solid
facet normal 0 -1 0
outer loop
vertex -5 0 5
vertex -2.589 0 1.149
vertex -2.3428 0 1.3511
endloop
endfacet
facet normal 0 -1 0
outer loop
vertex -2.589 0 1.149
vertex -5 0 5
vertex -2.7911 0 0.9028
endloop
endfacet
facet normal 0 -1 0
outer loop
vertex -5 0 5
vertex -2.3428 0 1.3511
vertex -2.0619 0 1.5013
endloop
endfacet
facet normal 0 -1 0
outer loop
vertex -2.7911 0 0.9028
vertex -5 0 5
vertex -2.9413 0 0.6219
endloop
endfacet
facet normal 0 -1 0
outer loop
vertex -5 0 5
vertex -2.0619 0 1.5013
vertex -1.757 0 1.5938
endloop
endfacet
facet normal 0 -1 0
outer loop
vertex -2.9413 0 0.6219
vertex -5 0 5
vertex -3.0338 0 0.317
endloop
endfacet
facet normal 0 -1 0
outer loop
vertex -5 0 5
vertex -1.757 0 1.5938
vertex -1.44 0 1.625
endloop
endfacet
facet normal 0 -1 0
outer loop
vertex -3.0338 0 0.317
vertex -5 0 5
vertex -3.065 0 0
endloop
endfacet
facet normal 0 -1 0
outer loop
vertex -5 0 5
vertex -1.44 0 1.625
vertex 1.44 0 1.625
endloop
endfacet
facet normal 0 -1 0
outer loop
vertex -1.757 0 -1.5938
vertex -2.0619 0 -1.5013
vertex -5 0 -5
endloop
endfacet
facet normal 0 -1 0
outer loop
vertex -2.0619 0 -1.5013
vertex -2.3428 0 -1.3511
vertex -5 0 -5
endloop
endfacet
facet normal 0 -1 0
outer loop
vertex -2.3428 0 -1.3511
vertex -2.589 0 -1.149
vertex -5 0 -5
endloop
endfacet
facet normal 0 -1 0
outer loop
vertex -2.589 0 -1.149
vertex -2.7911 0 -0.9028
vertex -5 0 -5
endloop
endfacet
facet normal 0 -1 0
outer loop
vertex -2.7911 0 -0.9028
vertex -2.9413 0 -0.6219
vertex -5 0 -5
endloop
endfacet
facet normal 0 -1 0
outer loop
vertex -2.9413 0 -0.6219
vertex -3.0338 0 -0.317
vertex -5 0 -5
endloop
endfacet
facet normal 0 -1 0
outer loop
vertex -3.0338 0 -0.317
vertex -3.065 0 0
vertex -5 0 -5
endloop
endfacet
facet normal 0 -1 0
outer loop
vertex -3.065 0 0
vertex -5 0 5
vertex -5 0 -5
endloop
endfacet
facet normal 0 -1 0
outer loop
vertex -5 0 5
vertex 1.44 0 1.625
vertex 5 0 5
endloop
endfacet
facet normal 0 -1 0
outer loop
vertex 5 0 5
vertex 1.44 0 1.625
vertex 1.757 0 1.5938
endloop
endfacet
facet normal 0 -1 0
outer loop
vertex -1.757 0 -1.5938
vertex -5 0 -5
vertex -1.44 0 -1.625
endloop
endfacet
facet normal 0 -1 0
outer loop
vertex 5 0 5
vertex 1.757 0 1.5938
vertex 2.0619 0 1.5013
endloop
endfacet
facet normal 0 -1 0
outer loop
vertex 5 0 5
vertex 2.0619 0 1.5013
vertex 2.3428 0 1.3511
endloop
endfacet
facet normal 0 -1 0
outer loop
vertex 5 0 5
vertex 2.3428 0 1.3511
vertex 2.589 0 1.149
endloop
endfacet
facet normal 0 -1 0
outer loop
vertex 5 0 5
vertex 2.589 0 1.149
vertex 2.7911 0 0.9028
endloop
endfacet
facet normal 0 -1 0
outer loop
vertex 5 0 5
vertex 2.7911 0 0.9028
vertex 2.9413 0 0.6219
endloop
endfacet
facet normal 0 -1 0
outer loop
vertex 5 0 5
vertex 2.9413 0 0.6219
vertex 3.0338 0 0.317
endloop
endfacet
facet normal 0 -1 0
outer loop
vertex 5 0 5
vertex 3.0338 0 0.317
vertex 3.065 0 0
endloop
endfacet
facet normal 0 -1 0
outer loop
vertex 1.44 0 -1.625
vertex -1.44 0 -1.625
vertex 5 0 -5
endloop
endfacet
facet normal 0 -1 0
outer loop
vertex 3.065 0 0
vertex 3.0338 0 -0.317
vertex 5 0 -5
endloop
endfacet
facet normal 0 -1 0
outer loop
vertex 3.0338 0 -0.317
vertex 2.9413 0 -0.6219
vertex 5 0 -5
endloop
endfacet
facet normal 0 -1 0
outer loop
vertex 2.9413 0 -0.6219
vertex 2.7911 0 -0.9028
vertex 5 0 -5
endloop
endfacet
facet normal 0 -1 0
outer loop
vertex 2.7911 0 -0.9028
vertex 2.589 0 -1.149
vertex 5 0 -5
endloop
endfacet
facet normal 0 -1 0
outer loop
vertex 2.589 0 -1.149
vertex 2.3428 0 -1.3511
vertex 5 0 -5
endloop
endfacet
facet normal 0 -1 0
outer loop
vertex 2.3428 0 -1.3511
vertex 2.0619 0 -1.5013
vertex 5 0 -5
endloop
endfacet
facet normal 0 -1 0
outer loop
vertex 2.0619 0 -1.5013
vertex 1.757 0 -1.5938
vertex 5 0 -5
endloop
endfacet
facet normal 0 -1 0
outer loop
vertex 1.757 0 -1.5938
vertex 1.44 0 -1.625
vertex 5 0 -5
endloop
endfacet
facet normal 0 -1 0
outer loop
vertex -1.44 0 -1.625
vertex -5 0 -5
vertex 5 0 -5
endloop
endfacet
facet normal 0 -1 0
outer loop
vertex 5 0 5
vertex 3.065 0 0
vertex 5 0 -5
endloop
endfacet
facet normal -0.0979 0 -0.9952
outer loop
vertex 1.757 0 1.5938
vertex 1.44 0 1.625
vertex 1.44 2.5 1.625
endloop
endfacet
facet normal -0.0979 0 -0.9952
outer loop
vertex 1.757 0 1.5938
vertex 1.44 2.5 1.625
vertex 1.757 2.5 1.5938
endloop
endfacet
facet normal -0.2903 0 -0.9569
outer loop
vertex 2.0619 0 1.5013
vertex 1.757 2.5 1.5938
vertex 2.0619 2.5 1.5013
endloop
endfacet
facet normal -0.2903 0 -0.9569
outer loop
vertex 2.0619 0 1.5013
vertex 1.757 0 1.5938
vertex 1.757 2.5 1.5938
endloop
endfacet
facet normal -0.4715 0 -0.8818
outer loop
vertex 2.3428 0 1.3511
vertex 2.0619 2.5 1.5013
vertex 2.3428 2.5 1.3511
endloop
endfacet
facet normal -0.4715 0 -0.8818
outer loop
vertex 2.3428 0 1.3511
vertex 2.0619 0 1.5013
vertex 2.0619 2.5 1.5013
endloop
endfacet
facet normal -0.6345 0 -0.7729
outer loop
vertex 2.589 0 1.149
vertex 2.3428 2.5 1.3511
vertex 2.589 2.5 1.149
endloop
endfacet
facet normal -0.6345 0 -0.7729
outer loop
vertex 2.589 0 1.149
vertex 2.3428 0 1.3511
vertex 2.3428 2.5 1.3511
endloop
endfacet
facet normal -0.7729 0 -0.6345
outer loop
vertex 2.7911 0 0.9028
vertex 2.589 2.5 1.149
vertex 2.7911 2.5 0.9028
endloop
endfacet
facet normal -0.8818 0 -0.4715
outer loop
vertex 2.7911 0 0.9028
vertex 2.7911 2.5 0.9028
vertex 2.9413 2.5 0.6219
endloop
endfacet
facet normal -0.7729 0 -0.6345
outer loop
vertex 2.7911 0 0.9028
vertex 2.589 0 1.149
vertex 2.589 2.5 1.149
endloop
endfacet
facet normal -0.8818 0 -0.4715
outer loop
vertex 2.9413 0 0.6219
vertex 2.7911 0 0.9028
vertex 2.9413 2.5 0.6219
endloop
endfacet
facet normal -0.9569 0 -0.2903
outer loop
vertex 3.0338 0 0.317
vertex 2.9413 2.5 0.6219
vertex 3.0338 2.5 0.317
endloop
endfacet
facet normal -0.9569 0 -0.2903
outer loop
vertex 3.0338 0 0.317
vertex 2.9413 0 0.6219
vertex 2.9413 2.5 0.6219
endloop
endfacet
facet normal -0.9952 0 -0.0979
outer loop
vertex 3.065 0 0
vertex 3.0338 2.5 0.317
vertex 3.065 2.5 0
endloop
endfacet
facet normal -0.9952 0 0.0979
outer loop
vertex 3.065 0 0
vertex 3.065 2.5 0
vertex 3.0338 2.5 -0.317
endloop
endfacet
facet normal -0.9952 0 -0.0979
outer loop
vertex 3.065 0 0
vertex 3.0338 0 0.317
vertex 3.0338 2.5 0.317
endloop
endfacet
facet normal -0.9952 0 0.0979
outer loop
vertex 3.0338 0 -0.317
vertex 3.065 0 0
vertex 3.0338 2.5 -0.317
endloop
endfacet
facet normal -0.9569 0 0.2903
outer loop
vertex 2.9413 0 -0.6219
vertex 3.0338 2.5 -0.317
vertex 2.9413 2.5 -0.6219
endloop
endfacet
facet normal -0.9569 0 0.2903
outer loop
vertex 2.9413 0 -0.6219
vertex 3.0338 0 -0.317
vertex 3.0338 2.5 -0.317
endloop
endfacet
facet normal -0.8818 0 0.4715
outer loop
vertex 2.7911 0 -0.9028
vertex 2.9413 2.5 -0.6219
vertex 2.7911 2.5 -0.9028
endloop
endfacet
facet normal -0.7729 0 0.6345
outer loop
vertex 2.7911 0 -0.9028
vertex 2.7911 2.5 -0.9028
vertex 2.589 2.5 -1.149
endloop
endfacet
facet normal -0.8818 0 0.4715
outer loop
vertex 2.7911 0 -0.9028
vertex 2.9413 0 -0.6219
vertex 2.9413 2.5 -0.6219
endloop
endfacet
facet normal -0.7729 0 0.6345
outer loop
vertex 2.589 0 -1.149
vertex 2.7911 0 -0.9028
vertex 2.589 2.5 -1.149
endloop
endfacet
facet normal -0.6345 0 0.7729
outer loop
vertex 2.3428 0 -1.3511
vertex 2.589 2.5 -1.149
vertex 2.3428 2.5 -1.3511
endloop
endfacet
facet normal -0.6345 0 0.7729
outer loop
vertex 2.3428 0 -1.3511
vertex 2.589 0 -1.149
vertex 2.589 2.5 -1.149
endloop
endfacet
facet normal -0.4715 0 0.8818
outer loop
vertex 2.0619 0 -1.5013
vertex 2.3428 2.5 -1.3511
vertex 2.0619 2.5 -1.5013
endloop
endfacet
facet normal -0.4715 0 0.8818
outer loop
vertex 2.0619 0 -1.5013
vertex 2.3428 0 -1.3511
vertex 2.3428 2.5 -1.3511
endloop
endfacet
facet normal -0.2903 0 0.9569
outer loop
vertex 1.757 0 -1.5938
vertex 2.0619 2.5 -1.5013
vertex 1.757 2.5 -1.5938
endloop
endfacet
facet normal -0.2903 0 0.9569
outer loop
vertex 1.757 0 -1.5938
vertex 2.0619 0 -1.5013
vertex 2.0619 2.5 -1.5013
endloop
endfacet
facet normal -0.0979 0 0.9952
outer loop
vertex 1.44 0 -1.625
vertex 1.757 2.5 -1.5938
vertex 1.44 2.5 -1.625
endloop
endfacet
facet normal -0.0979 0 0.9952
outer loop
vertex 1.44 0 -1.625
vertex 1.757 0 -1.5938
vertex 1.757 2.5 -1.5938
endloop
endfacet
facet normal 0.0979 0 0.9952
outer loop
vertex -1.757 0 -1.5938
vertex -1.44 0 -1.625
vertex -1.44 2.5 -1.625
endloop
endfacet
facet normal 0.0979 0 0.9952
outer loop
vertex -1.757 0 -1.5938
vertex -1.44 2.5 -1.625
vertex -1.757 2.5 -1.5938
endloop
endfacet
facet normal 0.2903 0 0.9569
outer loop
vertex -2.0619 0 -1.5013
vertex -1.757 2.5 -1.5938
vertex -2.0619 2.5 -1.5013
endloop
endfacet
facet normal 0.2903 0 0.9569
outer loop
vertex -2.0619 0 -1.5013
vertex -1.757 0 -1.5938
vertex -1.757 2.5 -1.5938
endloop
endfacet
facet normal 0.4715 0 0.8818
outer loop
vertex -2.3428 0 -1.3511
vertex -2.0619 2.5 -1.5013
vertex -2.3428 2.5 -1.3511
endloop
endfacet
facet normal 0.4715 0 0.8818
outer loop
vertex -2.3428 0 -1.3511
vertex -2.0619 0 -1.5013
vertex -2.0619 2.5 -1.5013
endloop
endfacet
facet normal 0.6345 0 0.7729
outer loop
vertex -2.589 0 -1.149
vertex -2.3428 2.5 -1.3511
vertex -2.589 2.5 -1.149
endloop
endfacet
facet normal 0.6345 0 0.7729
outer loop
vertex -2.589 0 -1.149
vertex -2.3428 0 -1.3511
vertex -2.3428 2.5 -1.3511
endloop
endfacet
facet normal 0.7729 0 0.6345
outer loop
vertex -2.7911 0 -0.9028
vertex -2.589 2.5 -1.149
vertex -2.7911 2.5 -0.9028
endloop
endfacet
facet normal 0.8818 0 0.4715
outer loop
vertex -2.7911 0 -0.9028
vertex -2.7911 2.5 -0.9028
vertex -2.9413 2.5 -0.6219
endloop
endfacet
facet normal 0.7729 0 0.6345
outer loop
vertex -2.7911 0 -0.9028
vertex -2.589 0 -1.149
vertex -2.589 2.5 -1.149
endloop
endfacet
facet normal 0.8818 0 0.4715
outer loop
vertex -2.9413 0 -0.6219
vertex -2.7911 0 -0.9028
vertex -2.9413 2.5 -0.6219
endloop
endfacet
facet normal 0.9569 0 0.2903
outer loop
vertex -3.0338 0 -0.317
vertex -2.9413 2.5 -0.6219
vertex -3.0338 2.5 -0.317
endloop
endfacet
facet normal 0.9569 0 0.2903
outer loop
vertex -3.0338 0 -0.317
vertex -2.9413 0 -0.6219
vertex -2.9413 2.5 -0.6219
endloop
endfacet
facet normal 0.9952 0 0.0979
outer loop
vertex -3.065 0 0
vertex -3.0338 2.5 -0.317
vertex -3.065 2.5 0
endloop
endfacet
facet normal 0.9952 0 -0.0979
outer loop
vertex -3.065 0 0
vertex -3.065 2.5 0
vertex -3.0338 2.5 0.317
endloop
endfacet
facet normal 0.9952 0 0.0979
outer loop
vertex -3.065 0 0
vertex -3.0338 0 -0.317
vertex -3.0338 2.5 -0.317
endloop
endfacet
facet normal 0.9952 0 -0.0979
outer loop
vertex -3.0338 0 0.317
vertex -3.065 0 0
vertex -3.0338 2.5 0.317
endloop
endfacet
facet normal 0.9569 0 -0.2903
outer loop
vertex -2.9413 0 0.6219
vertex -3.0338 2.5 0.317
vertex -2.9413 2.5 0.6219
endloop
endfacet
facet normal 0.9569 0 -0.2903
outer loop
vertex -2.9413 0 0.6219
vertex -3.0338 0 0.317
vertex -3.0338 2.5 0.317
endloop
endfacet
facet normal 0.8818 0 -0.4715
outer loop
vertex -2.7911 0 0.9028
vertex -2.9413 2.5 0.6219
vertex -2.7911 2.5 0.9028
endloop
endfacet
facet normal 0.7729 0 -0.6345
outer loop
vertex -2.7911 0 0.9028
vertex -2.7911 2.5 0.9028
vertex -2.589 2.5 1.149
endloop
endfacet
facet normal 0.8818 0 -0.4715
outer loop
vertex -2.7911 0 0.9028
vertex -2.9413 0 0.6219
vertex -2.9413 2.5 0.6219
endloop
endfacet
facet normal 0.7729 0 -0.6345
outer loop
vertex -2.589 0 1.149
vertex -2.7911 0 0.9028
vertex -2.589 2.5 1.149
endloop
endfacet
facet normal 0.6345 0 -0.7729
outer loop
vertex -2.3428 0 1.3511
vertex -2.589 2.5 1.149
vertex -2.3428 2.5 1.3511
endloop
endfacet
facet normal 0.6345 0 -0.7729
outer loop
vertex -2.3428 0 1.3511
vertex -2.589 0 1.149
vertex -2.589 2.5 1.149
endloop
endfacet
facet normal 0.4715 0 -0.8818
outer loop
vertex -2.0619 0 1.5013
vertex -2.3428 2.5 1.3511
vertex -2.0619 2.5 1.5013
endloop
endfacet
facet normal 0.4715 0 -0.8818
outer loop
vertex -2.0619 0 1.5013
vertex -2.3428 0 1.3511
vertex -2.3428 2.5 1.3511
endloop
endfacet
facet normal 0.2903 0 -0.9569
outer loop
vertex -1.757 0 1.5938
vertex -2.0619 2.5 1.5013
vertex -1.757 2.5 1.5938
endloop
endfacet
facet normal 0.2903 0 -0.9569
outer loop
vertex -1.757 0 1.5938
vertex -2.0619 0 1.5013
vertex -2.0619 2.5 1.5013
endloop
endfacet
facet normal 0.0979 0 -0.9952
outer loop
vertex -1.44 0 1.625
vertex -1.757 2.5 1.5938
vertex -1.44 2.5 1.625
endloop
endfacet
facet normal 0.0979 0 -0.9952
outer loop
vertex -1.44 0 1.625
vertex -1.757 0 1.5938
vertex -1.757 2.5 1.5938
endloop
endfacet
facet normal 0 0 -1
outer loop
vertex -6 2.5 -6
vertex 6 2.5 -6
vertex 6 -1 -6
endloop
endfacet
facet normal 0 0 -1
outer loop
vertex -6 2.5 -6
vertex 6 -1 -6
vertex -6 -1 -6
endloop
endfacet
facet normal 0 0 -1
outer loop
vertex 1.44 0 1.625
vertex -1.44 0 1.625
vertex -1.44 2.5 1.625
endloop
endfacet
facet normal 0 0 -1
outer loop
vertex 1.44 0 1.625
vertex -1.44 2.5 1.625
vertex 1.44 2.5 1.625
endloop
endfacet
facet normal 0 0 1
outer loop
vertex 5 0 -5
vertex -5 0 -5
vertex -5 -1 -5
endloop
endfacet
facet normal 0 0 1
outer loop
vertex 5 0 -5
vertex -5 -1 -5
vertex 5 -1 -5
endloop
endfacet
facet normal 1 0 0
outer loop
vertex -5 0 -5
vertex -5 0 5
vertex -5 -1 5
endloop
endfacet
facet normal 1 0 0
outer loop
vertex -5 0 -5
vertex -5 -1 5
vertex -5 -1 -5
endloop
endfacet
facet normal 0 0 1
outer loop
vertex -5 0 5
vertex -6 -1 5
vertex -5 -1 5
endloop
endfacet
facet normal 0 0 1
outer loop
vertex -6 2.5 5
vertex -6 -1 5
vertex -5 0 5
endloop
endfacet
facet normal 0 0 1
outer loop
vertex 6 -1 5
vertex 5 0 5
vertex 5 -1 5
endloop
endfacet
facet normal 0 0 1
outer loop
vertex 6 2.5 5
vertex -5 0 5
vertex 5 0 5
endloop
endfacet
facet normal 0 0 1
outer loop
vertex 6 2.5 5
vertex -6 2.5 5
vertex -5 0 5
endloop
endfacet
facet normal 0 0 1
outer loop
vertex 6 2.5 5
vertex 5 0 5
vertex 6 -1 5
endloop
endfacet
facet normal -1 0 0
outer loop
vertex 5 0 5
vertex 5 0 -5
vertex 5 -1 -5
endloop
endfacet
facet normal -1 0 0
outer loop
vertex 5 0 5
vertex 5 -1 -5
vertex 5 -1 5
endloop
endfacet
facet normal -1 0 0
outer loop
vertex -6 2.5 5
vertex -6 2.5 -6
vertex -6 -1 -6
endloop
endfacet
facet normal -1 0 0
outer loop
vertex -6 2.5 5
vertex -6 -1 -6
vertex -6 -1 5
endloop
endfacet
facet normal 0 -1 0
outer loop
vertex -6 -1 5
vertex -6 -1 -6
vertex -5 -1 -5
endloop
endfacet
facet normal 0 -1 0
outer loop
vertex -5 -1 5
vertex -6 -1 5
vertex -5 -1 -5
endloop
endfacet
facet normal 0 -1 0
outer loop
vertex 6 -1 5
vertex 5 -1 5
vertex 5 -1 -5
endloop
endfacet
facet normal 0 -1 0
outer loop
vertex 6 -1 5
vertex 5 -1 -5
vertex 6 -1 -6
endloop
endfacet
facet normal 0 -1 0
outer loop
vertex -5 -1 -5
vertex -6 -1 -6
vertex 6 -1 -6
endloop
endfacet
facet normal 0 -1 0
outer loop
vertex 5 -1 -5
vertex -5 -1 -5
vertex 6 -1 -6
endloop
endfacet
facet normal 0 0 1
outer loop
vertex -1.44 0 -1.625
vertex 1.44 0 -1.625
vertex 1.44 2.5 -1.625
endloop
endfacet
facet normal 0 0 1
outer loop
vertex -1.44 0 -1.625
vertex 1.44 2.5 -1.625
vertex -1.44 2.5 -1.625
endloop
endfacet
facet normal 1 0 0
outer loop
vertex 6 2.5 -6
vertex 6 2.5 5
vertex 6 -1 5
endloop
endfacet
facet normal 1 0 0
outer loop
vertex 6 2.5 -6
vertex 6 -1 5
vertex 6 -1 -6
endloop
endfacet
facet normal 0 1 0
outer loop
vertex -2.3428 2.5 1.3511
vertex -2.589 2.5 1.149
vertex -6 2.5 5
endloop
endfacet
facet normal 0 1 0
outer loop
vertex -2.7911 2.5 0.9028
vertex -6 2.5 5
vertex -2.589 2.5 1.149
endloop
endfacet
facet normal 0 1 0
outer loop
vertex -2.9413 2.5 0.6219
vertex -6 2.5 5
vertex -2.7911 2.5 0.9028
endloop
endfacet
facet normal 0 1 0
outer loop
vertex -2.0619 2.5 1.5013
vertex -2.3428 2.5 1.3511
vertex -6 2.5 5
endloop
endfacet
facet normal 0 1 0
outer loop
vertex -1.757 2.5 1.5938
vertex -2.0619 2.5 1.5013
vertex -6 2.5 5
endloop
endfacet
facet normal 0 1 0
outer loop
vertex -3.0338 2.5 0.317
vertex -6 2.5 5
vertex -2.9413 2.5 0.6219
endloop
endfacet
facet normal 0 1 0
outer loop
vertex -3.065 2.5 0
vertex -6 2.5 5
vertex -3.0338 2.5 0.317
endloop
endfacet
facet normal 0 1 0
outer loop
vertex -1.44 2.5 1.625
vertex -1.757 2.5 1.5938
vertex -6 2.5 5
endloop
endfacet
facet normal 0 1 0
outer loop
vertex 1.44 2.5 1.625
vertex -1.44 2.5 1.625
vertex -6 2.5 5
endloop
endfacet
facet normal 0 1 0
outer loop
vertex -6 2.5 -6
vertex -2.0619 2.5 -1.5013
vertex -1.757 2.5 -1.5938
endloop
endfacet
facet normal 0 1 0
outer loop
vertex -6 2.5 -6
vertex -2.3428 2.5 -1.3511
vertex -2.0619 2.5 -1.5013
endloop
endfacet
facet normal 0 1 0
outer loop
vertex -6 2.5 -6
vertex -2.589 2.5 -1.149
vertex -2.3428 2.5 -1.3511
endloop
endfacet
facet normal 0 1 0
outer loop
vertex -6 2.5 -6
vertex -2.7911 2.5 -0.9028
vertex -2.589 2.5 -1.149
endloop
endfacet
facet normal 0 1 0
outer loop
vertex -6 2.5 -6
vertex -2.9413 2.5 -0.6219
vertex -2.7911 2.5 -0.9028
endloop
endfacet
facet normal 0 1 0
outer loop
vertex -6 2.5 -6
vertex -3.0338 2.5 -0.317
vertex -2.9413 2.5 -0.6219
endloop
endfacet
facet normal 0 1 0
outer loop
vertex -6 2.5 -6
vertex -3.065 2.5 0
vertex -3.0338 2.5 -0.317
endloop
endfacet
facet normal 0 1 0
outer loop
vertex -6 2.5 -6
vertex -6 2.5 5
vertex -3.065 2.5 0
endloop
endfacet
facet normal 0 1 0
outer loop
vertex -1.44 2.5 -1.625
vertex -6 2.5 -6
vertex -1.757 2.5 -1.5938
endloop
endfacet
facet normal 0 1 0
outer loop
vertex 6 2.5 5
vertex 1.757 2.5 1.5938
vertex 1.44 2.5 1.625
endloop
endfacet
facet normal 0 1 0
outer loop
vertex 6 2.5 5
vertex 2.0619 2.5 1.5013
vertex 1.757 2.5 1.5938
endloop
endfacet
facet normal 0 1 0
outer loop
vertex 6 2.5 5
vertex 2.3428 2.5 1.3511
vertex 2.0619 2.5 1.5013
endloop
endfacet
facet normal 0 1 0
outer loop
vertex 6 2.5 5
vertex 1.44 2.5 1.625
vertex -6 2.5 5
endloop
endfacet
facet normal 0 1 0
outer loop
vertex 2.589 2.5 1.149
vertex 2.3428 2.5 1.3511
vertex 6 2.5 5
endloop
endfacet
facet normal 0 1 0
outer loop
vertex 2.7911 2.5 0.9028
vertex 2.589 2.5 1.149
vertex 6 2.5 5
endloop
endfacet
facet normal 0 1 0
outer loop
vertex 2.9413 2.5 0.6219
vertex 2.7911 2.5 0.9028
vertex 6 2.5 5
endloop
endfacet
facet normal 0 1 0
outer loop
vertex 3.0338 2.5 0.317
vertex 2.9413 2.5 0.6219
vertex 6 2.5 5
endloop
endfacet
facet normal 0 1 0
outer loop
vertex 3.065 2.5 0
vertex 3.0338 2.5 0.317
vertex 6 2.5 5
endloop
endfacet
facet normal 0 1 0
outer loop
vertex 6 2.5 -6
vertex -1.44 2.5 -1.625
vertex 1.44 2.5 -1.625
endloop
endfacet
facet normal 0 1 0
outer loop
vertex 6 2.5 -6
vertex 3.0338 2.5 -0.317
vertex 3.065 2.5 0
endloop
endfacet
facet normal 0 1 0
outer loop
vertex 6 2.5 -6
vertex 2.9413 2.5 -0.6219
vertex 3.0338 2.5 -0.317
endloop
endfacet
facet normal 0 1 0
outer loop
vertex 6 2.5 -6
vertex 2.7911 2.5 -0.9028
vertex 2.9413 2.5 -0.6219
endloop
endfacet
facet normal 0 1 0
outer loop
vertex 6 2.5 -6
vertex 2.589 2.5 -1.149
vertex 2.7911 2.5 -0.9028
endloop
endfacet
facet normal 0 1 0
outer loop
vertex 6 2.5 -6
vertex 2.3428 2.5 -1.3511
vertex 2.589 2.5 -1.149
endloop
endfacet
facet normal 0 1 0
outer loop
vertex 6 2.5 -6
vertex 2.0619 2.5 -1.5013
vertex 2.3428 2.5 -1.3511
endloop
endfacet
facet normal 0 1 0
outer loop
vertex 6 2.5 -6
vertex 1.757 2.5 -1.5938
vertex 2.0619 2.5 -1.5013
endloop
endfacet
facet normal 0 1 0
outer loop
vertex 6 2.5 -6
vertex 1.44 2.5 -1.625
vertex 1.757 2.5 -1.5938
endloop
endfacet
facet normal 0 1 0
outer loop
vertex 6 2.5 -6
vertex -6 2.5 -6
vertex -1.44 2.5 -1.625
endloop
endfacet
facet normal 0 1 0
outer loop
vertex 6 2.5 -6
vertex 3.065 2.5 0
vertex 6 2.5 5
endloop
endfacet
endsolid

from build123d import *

# Parameters (mm, degrees)
SKETCH1_W           = 10
SKETCH1_H           = 10
BOSS_EXTRUDE1_DEPTH = 2.5
BOSS_EXTRUDE2_DEPTH = 3.5


with BuildPart() as part:
    # Sketch1 → Boss-Extrude1 (new body)
    with BuildSketch(Plane(origin=(0, 0, 0), x_dir=(1, 0, 0), z_dir=(0, 1, 0))):
        Rectangle(SKETCH1_W, SKETCH1_H)
        with BuildLine():
            ThreePointArc((-1.44, 1.625), (-3.065, 0), (-1.44, -1.625))
            Line((-1.44, -1.625), (1.44, -1.625))
            ThreePointArc((1.44, -1.625), (3.065, 0), (1.44, 1.625))
            Line((1.44, 1.625), (-1.44, 1.625))
        make_face(mode=Mode.SUBTRACT)
    extrude(amount=BOSS_EXTRUDE1_DEPTH)

    # Sketch2 → Boss-Extrude2 (add)
    with BuildSketch(Plane(origin=(0, 2.5, 0), x_dir=(1, 0, 0), z_dir=(0, 1, 0))):
        Polygon((-5, -5), (-5, 5), (5, 5), (5, -5), (6, -5), (6, 6), (-6, 6), (-6, -5), align=None)
    extrude(amount=-BOSS_EXTRUDE2_DEPTH)


solid = part.part
